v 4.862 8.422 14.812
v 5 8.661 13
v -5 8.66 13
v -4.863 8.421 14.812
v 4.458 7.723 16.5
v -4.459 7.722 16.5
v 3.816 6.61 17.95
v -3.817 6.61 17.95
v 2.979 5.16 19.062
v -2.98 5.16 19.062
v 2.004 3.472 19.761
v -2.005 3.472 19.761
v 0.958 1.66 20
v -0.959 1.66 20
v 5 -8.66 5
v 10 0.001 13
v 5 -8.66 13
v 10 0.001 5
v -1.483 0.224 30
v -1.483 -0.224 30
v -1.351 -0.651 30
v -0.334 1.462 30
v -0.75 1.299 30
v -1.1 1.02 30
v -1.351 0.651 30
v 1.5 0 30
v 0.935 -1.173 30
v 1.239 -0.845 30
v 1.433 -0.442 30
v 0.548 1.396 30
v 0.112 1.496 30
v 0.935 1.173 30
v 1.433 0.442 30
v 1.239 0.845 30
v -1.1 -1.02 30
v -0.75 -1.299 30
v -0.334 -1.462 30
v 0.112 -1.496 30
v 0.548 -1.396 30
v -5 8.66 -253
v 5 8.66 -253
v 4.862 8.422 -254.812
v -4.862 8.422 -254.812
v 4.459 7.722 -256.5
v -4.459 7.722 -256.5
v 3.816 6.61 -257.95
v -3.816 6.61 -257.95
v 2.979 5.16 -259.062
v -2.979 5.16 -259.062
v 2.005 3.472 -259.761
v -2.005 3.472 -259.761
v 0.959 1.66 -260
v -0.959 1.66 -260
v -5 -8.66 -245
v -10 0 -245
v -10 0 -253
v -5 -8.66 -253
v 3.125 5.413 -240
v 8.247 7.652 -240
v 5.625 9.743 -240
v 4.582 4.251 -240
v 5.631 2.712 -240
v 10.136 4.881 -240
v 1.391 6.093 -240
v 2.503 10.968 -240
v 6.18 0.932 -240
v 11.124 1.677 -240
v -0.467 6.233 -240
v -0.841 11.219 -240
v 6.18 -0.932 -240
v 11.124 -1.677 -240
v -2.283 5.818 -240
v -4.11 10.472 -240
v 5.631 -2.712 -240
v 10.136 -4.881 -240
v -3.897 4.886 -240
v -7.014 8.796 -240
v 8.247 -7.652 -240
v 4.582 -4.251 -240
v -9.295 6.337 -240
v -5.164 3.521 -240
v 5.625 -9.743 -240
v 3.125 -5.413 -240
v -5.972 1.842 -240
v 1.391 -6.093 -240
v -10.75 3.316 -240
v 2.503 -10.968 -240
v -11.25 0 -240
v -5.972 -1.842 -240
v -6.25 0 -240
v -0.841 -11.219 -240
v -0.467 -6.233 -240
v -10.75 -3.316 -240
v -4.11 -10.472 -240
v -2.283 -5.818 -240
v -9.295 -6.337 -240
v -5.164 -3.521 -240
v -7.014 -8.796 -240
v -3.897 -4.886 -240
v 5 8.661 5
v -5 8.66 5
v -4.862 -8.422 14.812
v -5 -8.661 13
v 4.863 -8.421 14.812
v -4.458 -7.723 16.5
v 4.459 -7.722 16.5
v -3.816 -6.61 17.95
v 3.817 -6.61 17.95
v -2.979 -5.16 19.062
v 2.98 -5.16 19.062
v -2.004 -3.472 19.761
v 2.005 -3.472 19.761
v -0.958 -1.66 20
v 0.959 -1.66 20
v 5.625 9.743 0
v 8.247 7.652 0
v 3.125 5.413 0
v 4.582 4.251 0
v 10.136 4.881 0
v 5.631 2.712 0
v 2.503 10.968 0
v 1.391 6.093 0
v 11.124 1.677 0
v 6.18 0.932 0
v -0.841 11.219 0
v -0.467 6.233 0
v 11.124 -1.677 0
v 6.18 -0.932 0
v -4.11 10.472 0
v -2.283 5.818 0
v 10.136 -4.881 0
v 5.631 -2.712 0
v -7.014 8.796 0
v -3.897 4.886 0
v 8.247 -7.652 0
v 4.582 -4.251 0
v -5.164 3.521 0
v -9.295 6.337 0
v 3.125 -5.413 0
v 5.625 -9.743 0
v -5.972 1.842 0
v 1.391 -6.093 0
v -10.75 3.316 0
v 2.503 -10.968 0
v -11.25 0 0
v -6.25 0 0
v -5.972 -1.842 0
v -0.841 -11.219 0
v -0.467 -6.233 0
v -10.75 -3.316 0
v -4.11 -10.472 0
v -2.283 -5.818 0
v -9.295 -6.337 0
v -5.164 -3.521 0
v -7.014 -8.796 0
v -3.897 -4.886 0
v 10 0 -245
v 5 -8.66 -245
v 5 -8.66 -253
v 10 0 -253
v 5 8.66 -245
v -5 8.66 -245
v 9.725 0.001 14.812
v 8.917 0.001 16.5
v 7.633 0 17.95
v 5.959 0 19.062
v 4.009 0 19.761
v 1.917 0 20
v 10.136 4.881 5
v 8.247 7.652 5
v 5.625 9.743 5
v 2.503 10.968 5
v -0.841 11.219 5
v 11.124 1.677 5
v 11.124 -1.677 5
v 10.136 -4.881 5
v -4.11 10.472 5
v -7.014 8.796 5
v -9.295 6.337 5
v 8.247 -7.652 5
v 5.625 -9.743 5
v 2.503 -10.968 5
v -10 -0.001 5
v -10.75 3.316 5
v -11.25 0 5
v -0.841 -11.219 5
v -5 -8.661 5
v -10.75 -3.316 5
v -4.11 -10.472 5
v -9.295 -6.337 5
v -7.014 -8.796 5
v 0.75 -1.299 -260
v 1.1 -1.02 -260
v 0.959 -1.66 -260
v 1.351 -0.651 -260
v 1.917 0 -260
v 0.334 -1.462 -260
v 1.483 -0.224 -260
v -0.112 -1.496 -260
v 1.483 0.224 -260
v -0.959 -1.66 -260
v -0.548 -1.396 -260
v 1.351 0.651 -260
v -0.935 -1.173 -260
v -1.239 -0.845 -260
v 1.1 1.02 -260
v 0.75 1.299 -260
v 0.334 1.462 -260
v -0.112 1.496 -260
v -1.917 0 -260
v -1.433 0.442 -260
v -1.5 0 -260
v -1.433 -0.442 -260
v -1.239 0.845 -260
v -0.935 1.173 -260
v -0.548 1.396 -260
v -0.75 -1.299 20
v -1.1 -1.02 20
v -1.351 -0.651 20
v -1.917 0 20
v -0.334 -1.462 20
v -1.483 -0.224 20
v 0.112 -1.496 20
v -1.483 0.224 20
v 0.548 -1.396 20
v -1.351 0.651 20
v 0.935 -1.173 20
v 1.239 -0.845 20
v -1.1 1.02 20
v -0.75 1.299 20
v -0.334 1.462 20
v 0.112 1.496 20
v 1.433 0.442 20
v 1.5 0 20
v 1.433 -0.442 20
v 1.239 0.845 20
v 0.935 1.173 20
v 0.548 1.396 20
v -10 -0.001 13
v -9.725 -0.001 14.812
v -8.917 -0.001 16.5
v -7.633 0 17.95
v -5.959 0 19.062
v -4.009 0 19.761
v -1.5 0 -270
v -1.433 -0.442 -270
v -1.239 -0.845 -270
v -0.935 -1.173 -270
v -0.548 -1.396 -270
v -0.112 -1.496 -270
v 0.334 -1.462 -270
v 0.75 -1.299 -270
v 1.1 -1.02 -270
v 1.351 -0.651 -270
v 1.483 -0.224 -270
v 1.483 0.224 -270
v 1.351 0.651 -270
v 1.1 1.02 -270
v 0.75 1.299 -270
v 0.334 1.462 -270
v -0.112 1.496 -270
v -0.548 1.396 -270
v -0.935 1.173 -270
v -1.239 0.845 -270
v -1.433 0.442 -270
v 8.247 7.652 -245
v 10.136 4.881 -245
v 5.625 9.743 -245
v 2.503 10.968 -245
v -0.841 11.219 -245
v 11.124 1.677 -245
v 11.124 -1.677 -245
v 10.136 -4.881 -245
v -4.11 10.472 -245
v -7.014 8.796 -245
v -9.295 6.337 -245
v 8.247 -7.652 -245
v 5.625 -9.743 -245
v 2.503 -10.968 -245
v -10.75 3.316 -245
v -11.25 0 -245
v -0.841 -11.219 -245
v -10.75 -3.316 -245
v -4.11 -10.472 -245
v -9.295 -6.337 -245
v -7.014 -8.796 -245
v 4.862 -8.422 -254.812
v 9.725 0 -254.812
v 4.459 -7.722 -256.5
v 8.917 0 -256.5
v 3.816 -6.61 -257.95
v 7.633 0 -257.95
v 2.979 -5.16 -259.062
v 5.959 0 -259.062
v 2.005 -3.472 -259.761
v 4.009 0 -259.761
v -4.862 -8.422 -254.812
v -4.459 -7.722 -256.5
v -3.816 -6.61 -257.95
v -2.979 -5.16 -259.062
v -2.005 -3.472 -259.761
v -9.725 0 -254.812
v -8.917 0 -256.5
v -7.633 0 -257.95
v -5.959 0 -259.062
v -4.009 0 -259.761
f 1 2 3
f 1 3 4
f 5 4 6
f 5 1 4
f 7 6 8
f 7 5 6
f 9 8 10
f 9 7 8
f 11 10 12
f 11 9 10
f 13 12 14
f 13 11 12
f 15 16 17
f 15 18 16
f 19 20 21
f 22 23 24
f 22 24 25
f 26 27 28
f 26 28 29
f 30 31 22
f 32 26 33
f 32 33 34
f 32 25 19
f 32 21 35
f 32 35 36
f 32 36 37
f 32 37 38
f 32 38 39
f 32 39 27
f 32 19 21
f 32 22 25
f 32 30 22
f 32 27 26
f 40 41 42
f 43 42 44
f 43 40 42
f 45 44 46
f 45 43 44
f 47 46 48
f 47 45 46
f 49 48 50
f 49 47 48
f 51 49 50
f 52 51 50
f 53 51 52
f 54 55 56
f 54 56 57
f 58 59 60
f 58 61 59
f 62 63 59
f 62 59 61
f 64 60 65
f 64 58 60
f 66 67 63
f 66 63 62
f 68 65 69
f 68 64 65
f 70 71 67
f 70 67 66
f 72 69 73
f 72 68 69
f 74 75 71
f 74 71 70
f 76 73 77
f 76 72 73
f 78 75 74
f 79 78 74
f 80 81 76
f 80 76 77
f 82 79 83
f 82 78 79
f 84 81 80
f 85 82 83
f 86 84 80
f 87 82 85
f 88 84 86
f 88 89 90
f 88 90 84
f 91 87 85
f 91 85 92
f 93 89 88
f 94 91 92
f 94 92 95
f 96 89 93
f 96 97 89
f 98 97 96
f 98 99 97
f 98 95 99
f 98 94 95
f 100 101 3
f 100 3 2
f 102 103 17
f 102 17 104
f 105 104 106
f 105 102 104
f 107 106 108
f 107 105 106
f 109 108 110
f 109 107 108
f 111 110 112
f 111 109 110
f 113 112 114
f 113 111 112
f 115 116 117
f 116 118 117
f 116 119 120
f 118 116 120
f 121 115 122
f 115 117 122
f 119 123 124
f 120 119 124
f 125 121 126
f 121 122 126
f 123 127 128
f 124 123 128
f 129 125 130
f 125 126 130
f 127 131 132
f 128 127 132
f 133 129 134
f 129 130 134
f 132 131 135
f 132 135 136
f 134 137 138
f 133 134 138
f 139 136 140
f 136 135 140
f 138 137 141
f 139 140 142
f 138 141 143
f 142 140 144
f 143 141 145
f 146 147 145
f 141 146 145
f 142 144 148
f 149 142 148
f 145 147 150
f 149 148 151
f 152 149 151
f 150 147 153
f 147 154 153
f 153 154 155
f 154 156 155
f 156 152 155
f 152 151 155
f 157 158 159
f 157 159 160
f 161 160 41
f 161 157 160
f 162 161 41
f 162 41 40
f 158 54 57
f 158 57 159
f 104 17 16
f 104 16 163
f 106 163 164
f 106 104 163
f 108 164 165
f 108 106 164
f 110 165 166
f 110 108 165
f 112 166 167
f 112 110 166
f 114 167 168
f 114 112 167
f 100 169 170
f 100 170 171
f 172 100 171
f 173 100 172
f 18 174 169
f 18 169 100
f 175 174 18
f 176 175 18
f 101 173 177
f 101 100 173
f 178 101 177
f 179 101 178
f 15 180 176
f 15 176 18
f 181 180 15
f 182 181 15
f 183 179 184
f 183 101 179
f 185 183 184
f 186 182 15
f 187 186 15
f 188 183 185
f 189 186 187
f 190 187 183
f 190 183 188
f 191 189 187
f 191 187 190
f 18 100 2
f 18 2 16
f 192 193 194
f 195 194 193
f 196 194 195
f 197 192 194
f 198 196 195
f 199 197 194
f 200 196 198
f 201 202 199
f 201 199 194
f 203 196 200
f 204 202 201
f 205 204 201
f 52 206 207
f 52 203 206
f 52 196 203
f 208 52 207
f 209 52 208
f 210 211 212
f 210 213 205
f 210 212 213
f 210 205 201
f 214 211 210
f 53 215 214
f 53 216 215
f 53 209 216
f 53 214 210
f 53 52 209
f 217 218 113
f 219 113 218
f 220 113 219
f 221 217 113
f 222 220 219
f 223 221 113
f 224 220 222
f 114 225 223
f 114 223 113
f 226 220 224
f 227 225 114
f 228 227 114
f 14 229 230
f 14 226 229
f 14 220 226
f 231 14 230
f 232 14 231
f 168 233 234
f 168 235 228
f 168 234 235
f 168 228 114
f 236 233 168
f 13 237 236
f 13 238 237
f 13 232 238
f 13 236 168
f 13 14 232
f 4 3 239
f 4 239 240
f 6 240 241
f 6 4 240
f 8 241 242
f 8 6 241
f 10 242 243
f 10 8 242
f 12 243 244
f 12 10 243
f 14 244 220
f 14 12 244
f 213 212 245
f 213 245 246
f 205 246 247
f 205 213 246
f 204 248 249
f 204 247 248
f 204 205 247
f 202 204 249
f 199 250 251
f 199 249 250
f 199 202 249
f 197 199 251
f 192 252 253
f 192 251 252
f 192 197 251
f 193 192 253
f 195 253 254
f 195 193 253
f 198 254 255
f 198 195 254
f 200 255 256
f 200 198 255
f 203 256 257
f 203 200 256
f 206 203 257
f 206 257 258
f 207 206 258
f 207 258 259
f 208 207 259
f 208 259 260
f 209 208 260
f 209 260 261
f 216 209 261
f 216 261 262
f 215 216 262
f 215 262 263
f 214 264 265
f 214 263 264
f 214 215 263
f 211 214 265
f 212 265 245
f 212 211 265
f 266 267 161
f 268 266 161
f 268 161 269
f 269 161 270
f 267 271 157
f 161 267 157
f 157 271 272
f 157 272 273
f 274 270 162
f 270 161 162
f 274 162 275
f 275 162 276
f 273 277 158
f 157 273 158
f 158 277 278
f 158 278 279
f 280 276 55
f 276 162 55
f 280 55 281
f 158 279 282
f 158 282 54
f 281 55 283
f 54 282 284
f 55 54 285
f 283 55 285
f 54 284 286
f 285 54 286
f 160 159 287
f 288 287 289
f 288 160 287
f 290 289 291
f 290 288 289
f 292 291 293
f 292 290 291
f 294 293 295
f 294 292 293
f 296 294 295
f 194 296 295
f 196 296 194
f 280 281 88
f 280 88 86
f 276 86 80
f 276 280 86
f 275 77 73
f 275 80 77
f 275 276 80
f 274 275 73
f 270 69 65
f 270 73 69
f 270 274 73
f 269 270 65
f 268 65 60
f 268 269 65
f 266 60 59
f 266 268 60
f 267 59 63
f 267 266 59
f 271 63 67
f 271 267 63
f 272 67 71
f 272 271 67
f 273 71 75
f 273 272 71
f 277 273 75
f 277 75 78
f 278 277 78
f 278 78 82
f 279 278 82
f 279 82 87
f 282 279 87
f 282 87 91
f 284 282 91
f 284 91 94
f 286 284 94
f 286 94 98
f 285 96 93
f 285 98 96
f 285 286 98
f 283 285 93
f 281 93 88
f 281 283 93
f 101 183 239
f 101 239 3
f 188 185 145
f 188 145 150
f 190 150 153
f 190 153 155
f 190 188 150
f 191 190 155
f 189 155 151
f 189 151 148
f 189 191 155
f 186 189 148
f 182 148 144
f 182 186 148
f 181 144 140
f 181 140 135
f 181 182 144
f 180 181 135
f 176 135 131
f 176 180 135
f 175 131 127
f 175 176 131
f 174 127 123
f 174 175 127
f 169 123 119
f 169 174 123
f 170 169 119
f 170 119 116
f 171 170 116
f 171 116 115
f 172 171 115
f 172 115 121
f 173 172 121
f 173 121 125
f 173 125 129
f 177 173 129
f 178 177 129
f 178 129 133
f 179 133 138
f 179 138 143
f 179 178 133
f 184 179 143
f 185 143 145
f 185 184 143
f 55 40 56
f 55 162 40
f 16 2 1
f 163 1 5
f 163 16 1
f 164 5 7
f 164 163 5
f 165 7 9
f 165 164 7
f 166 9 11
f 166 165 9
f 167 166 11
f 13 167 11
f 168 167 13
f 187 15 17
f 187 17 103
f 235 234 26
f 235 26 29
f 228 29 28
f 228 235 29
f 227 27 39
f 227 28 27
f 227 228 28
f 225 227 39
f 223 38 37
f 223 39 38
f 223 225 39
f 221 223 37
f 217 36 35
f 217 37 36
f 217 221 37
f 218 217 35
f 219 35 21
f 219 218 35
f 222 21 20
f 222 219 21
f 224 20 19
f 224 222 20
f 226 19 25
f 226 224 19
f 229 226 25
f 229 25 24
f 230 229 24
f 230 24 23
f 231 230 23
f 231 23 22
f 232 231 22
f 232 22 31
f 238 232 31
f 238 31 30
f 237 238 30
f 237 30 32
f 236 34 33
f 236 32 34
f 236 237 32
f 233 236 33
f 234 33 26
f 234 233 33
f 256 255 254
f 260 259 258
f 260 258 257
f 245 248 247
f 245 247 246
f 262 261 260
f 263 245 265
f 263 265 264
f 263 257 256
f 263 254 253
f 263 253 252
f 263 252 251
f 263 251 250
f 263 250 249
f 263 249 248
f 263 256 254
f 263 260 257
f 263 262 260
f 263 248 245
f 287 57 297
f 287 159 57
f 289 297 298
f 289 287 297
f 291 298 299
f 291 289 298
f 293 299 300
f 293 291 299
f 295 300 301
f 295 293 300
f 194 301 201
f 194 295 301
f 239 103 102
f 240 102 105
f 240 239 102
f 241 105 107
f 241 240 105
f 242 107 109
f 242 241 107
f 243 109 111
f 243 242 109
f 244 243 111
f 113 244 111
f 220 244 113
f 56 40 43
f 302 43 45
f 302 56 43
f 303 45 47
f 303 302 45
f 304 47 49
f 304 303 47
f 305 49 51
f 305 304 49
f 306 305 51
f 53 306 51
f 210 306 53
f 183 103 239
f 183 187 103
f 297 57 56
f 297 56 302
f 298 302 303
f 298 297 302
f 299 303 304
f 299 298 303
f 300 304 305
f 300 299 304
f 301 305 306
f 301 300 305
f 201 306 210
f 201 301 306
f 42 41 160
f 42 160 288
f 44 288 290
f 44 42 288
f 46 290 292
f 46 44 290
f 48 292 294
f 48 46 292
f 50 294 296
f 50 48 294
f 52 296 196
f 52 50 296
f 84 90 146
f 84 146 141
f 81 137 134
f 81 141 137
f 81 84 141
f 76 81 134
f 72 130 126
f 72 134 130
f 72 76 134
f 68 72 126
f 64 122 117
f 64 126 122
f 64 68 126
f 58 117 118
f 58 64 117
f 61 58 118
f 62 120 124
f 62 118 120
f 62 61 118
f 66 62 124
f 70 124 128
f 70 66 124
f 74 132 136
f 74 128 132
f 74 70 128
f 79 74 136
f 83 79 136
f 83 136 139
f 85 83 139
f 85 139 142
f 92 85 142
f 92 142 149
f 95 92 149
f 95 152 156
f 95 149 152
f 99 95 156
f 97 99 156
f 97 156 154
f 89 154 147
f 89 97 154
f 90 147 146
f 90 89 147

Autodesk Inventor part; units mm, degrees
ref_plane "YZ Plane" through (0, 0, 0) normal (1, 0, 0) x (0, 1, 0)
ref_plane "XZ Plane" through (0, 0, 0) normal (0, 1, 0) x (-1, 0, 0)
ref_plane "XY Plane" through (0, 0, 0) normal (0, 0, 1) x (1, 0, 0)
sketch "Sketch2" plane through (0, 0, 0) normal (0, 1, 0) x (-1, 0, 0)
  line L0 (0, 0) -> (6.25, 0)
  line L1 (6.25, 0) -> (6.25, -240)
  line L2 (6.25, -240) -> (0, -240)
  line L3 (0, -240) -> (0, 0)
  line L4 (0, 0) -> (11.25, 0)
  line L5 (11.25, 0) -> (11.25, 5)
  line L6 (11.25, 5) -> (0, 5)
  line L7 (0, 5) -> (0, 0)
  line L8 (0, -240) -> (11.25, -240)
  line L9 (11.25, -240) -> (11.25, -245)
  line L10 (11.25, -245) -> (0, -245)
  line L11 (0, -245) -> (0, -240)
  dimension "d15" = 6.25
  dimension "d16" = 240
  dimension "d17" = 11.25
  dimension "d18" = 5
  dimension "d19" = 5
revolve "Revolution1" add sketch "Sketch2" angle 360 about axis through (0, 0, -240) along (0, 0, 1)
sketch "Sketch3" plane through (0, 0, 5) normal (0, 0, 1) x (1, 0, 0)
  line L0 (-10, -0.0006) -> (-5.0005, 8.66)
  line L1 (-5.0005, 8.66) -> (4.9995, 8.6606)
  line L2 (4.9995, 8.6606) -> (10, 0.0006)
  line L3 (10, 0.0006) -> (5.0005, -8.66)
  line L4 (5.0005, -8.66) -> (-4.9995, -8.6606)
  line L5 (-4.9995, -8.6606) -> (-10, -0.0006)
  point P0 (0, 0)
  point P1 (0, 0)
  dimension "d21" = 10
extrude "Extrusion1" add sketch "Sketch3" along normal blind 15
sketch "Sketch4" plane through (0, 0, -245) normal (0, 0, -1) x (-1, 0, 0)
  line L0 (-5, -8.6603) -> (-10, 0)
  line L1 (-10, 0) -> (-5, 8.6603)
  line L2 (-5, 8.6603) -> (5, 8.6603)
  line L3 (5, 8.6603) -> (10, 0)
  line L4 (10, 0) -> (5, -8.6603)
  line L5 (5, -8.6603) -> (-5, -8.6603)
  point P0 (0, 0)
  point P1 (0, 0)
  dimension "d24" = 10
extrude "Extrusion2" add sketch "Sketch4" along normal blind 15
fillet "Fillet1" radius 7 12 edges at (0, 8.6603, -260) (7.5, 4.3301, -260) (7.5, -4.3301, -260) (0, -8.6603, -260) (-7.5, -4.3301, -260) (-7.5, 4.3301, -260) (-7.5003, 4.3297, 20) (-0.0005, 8.6603, 20) (7.4997, 4.3306, 20) (7.5003, -4.3297, 20) (0.0005, -8.6603, 20) (-7.4997, -4.3306, 20)
sketch "Sketch5" plane through (0, 0, 20) normal (0, 0, 1) x (1, 0, 0)
  circle A0 centre (0, 0) radius 6.25 projected
  circle A1 centre (0, 0) radius 1.5
  point P0 (0, 0)
  dimension "d28" = 3
extrude "Extrusion3" add sketch "Sketch5" along normal blind 10 contours A1
sketch "Sketch6" plane through (0, 0, -260) normal (0, 0, -1) x (-1, 0, 0)
  circle A0 centre (0, 0) radius 1.5
  dimension "d31" = 3
extrude "Extrusion4" add sketch "Sketch6" along normal blind 10
properties part number "Resistencia"
